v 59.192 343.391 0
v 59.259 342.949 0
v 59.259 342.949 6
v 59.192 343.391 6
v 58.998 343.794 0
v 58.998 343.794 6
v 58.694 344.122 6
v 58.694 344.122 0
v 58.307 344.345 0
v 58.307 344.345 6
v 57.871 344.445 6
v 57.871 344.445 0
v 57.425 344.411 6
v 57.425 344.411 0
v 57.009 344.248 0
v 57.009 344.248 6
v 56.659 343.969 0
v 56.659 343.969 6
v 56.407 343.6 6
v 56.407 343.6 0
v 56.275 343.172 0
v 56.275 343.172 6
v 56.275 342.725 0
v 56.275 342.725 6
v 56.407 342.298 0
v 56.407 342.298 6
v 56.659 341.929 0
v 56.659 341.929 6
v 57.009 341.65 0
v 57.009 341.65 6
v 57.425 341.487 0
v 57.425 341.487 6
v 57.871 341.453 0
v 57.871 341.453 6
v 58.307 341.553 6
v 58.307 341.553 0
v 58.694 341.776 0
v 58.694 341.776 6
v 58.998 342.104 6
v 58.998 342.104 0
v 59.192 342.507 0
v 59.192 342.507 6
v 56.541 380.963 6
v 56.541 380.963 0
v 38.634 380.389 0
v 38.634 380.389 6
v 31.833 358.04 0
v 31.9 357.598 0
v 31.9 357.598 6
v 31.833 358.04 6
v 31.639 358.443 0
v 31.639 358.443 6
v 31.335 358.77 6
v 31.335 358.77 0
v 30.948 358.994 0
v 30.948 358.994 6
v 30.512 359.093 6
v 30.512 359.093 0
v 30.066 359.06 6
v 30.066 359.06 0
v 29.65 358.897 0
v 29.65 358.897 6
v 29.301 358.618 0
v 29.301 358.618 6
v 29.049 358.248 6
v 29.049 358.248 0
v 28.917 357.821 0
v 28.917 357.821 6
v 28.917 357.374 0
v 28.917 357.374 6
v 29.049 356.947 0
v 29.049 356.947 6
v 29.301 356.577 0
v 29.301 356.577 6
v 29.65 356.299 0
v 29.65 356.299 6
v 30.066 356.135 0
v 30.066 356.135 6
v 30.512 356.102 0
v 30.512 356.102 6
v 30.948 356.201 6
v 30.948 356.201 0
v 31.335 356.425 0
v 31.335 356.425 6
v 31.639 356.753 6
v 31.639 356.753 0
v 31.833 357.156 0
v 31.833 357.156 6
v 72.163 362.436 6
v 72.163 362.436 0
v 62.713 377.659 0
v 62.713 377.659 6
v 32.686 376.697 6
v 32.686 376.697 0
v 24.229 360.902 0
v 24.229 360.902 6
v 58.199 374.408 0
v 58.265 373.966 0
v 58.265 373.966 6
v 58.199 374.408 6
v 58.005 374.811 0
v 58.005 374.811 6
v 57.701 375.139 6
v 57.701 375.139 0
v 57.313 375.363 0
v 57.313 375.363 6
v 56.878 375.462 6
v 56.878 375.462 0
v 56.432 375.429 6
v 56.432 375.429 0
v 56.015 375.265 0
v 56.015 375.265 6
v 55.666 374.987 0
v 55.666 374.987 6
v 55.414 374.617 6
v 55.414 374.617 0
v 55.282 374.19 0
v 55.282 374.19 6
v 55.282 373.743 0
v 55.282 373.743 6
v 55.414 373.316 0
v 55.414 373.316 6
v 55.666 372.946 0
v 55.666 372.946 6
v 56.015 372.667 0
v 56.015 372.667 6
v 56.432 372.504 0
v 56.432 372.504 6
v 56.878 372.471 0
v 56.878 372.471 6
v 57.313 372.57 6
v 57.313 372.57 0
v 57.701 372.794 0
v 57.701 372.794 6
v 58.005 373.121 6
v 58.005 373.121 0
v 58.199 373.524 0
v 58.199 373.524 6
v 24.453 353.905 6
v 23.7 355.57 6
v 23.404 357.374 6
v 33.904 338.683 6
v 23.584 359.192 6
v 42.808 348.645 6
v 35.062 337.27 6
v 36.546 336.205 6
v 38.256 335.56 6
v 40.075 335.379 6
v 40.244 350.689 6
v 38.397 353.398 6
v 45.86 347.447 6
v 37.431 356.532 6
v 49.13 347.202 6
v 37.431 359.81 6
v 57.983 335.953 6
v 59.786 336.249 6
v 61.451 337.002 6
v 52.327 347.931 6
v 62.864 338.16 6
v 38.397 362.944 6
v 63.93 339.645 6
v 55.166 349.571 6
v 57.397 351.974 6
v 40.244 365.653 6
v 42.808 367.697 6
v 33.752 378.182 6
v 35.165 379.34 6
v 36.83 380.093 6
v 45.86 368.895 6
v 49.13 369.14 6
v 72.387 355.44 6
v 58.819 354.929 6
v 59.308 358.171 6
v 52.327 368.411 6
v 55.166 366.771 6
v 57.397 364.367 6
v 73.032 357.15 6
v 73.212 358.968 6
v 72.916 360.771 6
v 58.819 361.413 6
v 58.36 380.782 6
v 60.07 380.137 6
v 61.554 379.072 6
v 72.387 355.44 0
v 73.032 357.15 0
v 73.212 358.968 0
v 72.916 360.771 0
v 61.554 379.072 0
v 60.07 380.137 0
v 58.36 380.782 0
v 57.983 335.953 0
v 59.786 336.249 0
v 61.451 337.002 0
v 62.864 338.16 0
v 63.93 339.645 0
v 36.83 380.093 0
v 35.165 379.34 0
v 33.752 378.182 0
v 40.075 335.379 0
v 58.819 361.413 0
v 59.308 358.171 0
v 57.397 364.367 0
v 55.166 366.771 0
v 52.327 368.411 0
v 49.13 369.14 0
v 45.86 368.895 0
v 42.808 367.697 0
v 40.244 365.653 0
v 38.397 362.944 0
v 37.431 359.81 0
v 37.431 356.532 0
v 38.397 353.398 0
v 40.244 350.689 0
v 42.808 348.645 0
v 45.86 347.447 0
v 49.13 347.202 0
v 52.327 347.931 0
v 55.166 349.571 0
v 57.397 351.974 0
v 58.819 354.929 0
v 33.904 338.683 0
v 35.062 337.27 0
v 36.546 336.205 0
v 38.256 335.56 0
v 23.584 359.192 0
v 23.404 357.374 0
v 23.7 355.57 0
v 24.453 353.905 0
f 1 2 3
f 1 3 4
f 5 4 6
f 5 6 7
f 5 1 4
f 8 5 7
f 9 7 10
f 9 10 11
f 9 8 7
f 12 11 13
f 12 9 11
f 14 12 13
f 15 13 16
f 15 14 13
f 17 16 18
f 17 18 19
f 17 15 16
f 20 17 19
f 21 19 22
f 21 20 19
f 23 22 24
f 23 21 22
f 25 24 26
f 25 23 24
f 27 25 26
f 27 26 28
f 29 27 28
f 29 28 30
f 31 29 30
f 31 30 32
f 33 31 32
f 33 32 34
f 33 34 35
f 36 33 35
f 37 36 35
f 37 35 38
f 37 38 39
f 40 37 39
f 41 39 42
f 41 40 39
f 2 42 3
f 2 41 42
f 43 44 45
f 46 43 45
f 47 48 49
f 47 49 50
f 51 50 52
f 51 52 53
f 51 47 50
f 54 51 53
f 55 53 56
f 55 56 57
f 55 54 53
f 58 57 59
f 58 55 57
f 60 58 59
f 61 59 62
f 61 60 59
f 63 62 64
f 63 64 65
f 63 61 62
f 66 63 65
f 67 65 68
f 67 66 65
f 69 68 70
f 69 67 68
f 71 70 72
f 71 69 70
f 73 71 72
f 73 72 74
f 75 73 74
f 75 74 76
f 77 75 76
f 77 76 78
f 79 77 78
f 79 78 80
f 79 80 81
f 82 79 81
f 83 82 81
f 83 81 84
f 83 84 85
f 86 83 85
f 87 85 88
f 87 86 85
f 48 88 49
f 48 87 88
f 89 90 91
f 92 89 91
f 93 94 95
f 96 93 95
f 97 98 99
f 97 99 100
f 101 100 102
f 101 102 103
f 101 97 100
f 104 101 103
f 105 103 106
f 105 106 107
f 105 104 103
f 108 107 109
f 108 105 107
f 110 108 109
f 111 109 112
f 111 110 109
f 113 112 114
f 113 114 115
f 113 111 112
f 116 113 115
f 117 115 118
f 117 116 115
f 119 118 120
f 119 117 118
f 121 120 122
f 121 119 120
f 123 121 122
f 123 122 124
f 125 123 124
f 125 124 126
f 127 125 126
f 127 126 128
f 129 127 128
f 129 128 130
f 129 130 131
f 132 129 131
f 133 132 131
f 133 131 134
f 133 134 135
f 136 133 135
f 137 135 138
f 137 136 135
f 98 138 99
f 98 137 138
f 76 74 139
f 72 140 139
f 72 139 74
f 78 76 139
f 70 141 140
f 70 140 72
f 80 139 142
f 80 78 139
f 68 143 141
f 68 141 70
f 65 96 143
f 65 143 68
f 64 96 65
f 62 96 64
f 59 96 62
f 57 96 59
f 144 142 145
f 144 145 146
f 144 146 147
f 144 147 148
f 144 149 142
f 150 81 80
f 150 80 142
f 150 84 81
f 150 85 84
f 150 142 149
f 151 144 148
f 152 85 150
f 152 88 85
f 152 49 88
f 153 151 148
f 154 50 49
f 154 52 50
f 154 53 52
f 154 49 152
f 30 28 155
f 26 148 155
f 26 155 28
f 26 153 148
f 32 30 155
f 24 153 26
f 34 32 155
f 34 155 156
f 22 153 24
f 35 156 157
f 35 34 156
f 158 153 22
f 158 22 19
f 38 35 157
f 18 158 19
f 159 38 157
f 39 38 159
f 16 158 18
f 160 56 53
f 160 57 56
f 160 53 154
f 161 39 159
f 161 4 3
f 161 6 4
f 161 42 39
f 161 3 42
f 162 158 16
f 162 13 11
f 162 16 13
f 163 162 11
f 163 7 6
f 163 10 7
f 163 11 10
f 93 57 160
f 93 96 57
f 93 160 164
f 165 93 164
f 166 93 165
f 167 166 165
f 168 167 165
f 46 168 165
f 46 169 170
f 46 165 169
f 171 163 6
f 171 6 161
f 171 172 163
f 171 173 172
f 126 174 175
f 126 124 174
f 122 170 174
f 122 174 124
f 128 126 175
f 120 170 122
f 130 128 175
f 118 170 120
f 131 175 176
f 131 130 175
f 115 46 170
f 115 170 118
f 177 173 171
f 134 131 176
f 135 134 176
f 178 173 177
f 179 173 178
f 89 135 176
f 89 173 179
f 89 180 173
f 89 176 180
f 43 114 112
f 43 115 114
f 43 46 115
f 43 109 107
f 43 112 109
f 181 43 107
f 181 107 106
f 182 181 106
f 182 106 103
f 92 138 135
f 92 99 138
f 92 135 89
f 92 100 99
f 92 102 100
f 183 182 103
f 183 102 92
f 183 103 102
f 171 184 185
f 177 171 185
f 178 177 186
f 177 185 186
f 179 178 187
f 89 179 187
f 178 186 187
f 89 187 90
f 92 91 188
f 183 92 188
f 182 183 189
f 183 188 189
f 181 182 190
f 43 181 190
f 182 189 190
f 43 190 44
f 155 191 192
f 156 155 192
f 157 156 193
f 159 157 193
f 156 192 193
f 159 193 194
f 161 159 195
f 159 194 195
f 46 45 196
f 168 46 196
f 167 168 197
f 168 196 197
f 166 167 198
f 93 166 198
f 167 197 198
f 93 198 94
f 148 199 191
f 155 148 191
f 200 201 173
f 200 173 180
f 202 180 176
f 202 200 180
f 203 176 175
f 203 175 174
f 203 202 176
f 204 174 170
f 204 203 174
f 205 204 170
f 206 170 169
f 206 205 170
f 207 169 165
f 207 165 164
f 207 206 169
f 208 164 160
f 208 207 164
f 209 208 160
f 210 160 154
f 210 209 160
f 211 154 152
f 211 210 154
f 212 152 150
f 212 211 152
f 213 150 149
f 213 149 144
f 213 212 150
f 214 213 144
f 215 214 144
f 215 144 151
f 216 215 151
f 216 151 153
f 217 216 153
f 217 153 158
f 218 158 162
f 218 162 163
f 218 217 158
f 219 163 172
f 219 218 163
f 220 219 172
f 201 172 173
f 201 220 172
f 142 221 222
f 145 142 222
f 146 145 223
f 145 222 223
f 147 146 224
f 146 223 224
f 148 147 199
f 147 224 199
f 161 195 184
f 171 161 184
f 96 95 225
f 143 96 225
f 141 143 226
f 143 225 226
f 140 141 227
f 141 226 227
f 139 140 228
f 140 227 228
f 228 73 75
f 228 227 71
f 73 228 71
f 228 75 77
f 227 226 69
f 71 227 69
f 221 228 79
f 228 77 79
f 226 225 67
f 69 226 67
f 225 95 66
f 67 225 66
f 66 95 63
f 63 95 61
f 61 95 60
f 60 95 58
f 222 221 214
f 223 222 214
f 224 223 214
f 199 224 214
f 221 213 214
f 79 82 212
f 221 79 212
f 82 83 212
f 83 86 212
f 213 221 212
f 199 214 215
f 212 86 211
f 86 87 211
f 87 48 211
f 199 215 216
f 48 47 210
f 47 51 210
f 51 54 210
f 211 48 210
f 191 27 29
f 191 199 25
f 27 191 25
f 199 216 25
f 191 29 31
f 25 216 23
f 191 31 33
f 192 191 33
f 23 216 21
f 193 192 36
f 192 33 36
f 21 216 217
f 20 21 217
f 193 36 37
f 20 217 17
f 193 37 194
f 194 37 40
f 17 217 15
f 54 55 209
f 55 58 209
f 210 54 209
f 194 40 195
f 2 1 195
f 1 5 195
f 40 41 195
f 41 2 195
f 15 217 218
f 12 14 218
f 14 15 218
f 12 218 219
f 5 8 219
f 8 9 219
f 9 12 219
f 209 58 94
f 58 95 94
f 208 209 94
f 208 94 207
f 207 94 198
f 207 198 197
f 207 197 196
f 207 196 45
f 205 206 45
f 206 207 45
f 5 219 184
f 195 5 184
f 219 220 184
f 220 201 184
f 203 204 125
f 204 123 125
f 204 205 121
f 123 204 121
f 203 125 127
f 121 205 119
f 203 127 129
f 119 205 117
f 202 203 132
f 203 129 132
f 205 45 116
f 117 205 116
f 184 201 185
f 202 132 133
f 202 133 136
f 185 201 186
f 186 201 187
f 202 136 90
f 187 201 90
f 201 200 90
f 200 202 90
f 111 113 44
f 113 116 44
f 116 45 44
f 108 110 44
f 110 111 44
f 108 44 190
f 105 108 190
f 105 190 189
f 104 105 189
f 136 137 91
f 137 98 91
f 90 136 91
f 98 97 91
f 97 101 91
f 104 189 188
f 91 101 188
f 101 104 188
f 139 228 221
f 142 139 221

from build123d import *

# Parameters (mm, degrees)
SKETCH1_R           = 1.5
SKETCH1_R_2         = 11
BOSS_EXTRUDE1_DEPTH = 6


with BuildPart() as part:
    # Sketch1 → Boss-Extrude1 (new body)
    with BuildSketch(Plane.XY):
        with BuildLine():
            Line((24.453034096, 353.905456547), (33.903511888, 338.683406525))
            ThreePointArc((33.903511888, 338.683406525), (36.546364709, 336.204527868), (40.074581718, 335.379182388))
            Line((40.074581718, 335.379182388), (57.982502631, 335.952511222))
            ThreePointArc((57.982502631, 335.952511222), (61.450700931, 337.001849574), (63.929579589, 339.644702395))
            Line((63.929579589, 339.644702395), (72.38702271, 355.440081251))
            ThreePointArc((72.38702271, 355.440081251), (73.21236819, 358.968298261), (72.163029838, 362.436496561))
            Line((72.163029838, 362.436496561), (62.712552046, 377.658546583))
            ThreePointArc((62.712552046, 377.658546583), (60.069699226, 380.137425241), (56.541482216, 380.962770721))
            Line((56.541482216, 380.962770721), (38.633561304, 380.389441887))
            ThreePointArc((38.633561304, 380.389441887), (35.165363003, 379.340103535), (32.686484345, 376.697250714))
            Line((32.686484345, 376.697250714), (24.229041225, 360.901871858))
            ThreePointArc((24.229041225, 360.901871858), (23.403695744, 357.373654848), (24.453034096, 353.905456547))
        make_face()
        with Locations((57.758509759, 342.948926532)):
            Circle(SKETCH1_R, mode=Mode.SUBTRACT)
        with Locations((48.308031967, 358.170976554)):
            Circle(SKETCH1_R_2, mode=Mode.SUBTRACT)
        with Locations((56.765475088, 373.966355411)):
            Circle(SKETCH1_R, mode=Mode.SUBTRACT)
        with Locations((30.400111055, 357.59764772)):
            Circle(SKETCH1_R, mode=Mode.SUBTRACT)
    extrude(amount=BOSS_EXTRUDE1_DEPTH)


solid = part.part
